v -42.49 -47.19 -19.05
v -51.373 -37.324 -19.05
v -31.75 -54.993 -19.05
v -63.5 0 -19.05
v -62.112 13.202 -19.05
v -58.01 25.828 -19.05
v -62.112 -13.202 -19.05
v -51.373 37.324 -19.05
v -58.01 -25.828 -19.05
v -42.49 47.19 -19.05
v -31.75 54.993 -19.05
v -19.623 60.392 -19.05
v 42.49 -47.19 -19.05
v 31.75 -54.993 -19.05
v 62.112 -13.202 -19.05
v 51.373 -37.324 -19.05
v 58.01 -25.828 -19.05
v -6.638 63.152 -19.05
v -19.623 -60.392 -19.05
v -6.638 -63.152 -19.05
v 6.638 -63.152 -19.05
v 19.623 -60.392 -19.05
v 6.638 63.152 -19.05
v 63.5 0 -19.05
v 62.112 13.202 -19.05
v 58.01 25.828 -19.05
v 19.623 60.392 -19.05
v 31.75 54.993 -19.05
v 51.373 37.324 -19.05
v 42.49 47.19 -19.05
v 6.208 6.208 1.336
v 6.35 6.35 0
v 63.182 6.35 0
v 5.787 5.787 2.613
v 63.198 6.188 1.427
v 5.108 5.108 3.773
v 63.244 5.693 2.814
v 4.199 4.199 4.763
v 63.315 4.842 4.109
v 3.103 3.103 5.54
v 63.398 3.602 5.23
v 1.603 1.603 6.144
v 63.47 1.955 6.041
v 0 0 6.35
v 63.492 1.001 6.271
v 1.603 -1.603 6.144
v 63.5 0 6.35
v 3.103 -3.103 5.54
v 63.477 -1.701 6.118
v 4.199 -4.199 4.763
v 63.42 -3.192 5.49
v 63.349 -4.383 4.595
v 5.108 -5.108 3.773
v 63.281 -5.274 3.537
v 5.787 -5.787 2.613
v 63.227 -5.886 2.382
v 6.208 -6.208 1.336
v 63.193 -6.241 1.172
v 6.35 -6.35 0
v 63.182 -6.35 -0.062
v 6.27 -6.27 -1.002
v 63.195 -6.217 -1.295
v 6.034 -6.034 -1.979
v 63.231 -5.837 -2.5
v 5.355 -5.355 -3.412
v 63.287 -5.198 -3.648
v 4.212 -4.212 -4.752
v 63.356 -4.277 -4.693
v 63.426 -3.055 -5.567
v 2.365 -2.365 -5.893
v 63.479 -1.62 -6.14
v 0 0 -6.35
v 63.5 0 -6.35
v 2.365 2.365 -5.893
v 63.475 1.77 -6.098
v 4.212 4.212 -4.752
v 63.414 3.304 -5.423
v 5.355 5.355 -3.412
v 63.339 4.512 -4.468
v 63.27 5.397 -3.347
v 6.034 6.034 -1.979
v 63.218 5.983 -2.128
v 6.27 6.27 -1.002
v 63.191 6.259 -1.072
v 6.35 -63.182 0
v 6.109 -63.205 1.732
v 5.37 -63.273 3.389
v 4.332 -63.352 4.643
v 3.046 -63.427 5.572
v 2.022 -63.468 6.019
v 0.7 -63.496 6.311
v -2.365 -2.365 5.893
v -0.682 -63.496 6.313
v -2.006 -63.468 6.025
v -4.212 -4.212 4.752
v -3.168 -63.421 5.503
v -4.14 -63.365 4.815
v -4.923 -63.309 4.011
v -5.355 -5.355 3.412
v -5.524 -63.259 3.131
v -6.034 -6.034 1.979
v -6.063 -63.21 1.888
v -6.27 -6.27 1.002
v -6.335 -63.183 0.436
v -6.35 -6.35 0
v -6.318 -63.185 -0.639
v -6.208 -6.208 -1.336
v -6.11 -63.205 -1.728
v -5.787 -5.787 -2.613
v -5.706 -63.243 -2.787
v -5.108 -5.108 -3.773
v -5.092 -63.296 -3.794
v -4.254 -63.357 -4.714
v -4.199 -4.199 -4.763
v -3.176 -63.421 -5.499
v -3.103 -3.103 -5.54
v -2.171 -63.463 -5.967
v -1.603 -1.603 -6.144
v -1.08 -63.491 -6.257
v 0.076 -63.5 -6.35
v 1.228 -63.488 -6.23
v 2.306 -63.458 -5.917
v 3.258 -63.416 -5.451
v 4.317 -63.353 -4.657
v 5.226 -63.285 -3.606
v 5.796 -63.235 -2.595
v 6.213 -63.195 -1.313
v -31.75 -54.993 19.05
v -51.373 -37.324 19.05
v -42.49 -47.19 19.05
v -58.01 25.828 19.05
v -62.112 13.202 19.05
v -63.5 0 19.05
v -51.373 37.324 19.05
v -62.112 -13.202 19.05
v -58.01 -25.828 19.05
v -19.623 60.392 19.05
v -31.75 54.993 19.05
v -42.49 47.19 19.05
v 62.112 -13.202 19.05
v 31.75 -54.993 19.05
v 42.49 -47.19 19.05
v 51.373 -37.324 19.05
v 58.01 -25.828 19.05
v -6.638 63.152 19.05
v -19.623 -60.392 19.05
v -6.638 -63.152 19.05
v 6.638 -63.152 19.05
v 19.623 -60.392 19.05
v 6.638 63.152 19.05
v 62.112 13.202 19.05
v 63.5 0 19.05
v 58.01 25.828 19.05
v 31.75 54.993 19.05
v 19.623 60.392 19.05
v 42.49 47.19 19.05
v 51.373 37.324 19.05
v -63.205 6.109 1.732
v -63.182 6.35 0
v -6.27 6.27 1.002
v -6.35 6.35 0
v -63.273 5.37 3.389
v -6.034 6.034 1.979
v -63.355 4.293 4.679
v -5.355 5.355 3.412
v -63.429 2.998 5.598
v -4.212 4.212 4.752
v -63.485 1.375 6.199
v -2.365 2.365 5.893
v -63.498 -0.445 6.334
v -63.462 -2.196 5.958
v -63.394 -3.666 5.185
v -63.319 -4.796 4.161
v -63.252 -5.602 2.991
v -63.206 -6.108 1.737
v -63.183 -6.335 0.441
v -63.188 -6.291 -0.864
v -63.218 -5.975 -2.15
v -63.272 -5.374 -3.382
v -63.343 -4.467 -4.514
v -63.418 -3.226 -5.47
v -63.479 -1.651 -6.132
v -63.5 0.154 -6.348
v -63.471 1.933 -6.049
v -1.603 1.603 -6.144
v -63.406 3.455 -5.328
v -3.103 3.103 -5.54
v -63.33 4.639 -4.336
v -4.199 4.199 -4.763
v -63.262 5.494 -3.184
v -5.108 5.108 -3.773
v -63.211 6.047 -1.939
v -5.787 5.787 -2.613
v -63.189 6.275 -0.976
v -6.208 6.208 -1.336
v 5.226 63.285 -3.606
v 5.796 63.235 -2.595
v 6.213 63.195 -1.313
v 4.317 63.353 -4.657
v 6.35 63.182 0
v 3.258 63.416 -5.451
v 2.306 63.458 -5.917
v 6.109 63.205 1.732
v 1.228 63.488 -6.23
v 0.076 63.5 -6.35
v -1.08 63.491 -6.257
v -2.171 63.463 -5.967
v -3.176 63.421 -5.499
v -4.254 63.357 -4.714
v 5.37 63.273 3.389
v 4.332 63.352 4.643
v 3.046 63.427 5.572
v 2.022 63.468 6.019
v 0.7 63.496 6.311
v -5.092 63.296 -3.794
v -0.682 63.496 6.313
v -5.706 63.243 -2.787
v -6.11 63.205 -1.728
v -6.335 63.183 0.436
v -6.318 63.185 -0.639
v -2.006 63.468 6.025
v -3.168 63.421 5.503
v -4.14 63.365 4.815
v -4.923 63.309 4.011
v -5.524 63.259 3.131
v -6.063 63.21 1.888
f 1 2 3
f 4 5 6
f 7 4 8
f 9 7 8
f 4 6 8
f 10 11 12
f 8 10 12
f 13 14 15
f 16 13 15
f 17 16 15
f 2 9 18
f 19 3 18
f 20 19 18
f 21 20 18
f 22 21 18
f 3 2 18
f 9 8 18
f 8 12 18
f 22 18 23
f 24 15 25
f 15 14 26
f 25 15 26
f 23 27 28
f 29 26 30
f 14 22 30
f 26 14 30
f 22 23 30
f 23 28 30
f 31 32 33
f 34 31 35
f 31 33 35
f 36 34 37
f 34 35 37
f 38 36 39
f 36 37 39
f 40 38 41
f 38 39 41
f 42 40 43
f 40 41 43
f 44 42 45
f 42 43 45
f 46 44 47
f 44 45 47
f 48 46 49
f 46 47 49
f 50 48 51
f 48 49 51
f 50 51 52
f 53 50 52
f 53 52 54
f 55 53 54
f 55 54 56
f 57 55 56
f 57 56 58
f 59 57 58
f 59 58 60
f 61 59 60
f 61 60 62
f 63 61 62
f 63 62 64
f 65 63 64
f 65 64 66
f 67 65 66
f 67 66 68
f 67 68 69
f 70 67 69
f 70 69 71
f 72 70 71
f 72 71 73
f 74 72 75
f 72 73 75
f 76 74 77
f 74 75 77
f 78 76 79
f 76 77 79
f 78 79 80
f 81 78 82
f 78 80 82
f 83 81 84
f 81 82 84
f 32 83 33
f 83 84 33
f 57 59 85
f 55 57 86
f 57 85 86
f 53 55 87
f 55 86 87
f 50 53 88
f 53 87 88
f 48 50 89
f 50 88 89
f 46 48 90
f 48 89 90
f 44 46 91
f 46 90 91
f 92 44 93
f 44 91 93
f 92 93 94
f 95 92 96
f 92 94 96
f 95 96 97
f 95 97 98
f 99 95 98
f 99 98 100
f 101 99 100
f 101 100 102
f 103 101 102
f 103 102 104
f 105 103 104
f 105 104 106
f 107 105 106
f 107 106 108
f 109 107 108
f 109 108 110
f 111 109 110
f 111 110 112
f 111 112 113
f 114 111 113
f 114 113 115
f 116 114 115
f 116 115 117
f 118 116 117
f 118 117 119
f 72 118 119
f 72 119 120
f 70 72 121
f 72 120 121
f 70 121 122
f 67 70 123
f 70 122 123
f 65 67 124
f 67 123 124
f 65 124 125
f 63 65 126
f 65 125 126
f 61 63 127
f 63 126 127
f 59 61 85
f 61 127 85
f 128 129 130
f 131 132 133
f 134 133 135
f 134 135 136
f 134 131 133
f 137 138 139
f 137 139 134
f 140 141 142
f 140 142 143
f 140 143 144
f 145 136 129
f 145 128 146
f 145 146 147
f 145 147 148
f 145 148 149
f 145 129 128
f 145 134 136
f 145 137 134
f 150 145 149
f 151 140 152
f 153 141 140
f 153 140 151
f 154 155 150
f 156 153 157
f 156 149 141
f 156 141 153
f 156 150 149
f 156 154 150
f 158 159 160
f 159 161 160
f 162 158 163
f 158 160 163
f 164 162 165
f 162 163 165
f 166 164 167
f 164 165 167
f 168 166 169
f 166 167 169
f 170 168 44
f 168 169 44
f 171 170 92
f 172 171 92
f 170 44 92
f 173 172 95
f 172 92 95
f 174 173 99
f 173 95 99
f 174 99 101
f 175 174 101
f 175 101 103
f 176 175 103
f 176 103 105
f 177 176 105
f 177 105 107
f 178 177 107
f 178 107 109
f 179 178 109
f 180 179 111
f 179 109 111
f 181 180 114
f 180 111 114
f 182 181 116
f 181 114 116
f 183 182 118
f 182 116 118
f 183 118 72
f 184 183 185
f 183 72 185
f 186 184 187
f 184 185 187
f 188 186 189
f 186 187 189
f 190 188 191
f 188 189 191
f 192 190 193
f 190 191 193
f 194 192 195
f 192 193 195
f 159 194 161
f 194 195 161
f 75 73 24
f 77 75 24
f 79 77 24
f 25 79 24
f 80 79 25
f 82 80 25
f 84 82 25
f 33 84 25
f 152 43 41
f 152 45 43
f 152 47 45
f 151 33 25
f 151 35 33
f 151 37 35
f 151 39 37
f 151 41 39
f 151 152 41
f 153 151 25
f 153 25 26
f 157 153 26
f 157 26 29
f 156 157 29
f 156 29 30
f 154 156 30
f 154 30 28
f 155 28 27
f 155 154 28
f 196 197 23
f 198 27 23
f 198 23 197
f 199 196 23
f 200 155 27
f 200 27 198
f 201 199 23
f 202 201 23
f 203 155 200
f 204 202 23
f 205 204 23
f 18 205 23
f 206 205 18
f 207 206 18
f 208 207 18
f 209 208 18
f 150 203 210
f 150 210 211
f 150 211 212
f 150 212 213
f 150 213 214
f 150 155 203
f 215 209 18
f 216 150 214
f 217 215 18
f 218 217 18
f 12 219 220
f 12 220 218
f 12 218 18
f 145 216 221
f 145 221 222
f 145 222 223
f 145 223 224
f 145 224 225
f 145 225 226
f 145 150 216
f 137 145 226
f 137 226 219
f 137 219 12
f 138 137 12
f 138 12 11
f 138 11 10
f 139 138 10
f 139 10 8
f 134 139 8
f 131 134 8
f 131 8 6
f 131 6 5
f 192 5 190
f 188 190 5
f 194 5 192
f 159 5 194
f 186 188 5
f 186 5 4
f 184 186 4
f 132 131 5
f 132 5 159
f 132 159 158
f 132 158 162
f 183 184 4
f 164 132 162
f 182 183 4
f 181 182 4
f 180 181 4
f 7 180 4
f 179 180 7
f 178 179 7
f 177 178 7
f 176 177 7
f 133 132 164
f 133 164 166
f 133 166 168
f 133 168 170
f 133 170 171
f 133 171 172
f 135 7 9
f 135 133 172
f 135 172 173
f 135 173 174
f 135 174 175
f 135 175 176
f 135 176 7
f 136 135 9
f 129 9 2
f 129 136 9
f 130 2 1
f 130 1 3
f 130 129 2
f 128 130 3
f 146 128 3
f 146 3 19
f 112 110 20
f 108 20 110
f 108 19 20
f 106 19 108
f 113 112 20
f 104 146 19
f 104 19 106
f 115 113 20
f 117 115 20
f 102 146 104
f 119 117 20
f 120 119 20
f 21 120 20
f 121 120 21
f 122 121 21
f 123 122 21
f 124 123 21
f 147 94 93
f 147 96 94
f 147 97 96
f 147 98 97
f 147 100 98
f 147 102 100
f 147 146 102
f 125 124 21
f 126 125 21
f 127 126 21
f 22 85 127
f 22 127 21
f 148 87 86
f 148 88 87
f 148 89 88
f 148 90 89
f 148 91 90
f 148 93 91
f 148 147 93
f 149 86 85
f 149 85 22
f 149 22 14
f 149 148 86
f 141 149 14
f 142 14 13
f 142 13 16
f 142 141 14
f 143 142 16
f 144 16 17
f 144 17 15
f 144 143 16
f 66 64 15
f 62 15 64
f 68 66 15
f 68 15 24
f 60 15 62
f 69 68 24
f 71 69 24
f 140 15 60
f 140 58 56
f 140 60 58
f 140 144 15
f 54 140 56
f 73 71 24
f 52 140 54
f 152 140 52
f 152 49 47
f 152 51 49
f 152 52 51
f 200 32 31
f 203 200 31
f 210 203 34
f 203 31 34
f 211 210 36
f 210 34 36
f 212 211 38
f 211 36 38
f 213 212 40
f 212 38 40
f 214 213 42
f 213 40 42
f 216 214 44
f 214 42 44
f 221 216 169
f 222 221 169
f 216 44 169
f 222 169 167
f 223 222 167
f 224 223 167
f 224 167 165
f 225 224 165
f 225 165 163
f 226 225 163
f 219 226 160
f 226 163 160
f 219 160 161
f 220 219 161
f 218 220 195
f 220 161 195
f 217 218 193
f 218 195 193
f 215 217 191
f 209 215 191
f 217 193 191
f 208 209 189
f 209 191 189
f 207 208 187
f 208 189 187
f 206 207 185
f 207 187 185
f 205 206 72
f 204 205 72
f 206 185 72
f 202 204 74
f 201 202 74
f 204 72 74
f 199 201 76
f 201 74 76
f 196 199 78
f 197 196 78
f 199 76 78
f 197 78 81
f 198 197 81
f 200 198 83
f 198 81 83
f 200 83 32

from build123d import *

# Parameters (mm, degrees)
F0_R     = 63.5
F1_DEPTH = 19.05
F2_R     = 6.35
F3_DEPTH = 381
F4_R     = 6.35
F5_DEPTH = 381


with BuildPart() as f1:
    # F0 (on Top) → F1 (new body, symmetric)
    with BuildSketch(Plane.XY):
        Circle(F0_R)
    extrude(amount=F1_DEPTH, both=True)

    # F2 (on Front) → F3 (cut, symmetric)
    with BuildSketch(Plane.XZ):
        Circle(F2_R)
    extrude(amount=F3_DEPTH, both=True, mode=Mode.SUBTRACT)

    # F4 (on Right) → F5 (cut, symmetric)
    with BuildSketch(Plane.YZ):
        Circle(F4_R)
    extrude(amount=F5_DEPTH, both=True, mode=Mode.SUBTRACT)


solid = f1.part
